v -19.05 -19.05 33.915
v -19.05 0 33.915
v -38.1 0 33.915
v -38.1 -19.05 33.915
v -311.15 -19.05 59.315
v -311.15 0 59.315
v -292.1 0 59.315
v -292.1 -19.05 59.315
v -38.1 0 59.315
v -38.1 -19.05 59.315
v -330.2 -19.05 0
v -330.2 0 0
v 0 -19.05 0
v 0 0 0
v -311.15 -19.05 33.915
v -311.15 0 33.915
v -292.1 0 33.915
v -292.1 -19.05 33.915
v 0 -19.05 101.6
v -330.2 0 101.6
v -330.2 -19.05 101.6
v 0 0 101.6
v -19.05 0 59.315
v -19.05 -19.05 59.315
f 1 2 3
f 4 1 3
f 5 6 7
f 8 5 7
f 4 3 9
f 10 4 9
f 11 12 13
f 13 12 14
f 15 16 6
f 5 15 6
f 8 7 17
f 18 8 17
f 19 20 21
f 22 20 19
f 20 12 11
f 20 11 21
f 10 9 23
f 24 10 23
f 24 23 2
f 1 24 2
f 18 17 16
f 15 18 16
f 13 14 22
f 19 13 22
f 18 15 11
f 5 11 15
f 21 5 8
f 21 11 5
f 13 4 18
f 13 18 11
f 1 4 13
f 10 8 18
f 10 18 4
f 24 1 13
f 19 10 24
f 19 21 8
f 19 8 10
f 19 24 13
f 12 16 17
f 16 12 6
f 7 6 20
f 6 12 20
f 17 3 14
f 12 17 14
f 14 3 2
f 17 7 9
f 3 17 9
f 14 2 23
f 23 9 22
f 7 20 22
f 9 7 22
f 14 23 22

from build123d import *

# Parameters (mm, degrees)
F0_W     = 330.2
F0_H     = 101.6
F1_DEPTH = 19.05


with BuildPart() as f1:
    # F0 (on Front) → F1 (new body)
    with BuildSketch(Plane.XZ):
        with Locations((-165.1, 50.8)):
            Rectangle(F0_W, F0_H)
        Polygon((-311.15, 33.914647), (-311.15, 46.614647), (-311.15, 59.314647), (-292.1, 59.314647), (-292.1, 46.614647), (-292.1, 33.914647), align=None, mode=Mode.SUBTRACT)
        Polygon((-38.1, 33.914647), (-38.1, 46.614647), (-38.1, 59.314647), (-19.05, 59.314647), (-19.05, 46.614647), (-19.05, 33.914647), align=None, mode=Mode.SUBTRACT)
    extrude(amount=F1_DEPTH)


solid = f1.part
